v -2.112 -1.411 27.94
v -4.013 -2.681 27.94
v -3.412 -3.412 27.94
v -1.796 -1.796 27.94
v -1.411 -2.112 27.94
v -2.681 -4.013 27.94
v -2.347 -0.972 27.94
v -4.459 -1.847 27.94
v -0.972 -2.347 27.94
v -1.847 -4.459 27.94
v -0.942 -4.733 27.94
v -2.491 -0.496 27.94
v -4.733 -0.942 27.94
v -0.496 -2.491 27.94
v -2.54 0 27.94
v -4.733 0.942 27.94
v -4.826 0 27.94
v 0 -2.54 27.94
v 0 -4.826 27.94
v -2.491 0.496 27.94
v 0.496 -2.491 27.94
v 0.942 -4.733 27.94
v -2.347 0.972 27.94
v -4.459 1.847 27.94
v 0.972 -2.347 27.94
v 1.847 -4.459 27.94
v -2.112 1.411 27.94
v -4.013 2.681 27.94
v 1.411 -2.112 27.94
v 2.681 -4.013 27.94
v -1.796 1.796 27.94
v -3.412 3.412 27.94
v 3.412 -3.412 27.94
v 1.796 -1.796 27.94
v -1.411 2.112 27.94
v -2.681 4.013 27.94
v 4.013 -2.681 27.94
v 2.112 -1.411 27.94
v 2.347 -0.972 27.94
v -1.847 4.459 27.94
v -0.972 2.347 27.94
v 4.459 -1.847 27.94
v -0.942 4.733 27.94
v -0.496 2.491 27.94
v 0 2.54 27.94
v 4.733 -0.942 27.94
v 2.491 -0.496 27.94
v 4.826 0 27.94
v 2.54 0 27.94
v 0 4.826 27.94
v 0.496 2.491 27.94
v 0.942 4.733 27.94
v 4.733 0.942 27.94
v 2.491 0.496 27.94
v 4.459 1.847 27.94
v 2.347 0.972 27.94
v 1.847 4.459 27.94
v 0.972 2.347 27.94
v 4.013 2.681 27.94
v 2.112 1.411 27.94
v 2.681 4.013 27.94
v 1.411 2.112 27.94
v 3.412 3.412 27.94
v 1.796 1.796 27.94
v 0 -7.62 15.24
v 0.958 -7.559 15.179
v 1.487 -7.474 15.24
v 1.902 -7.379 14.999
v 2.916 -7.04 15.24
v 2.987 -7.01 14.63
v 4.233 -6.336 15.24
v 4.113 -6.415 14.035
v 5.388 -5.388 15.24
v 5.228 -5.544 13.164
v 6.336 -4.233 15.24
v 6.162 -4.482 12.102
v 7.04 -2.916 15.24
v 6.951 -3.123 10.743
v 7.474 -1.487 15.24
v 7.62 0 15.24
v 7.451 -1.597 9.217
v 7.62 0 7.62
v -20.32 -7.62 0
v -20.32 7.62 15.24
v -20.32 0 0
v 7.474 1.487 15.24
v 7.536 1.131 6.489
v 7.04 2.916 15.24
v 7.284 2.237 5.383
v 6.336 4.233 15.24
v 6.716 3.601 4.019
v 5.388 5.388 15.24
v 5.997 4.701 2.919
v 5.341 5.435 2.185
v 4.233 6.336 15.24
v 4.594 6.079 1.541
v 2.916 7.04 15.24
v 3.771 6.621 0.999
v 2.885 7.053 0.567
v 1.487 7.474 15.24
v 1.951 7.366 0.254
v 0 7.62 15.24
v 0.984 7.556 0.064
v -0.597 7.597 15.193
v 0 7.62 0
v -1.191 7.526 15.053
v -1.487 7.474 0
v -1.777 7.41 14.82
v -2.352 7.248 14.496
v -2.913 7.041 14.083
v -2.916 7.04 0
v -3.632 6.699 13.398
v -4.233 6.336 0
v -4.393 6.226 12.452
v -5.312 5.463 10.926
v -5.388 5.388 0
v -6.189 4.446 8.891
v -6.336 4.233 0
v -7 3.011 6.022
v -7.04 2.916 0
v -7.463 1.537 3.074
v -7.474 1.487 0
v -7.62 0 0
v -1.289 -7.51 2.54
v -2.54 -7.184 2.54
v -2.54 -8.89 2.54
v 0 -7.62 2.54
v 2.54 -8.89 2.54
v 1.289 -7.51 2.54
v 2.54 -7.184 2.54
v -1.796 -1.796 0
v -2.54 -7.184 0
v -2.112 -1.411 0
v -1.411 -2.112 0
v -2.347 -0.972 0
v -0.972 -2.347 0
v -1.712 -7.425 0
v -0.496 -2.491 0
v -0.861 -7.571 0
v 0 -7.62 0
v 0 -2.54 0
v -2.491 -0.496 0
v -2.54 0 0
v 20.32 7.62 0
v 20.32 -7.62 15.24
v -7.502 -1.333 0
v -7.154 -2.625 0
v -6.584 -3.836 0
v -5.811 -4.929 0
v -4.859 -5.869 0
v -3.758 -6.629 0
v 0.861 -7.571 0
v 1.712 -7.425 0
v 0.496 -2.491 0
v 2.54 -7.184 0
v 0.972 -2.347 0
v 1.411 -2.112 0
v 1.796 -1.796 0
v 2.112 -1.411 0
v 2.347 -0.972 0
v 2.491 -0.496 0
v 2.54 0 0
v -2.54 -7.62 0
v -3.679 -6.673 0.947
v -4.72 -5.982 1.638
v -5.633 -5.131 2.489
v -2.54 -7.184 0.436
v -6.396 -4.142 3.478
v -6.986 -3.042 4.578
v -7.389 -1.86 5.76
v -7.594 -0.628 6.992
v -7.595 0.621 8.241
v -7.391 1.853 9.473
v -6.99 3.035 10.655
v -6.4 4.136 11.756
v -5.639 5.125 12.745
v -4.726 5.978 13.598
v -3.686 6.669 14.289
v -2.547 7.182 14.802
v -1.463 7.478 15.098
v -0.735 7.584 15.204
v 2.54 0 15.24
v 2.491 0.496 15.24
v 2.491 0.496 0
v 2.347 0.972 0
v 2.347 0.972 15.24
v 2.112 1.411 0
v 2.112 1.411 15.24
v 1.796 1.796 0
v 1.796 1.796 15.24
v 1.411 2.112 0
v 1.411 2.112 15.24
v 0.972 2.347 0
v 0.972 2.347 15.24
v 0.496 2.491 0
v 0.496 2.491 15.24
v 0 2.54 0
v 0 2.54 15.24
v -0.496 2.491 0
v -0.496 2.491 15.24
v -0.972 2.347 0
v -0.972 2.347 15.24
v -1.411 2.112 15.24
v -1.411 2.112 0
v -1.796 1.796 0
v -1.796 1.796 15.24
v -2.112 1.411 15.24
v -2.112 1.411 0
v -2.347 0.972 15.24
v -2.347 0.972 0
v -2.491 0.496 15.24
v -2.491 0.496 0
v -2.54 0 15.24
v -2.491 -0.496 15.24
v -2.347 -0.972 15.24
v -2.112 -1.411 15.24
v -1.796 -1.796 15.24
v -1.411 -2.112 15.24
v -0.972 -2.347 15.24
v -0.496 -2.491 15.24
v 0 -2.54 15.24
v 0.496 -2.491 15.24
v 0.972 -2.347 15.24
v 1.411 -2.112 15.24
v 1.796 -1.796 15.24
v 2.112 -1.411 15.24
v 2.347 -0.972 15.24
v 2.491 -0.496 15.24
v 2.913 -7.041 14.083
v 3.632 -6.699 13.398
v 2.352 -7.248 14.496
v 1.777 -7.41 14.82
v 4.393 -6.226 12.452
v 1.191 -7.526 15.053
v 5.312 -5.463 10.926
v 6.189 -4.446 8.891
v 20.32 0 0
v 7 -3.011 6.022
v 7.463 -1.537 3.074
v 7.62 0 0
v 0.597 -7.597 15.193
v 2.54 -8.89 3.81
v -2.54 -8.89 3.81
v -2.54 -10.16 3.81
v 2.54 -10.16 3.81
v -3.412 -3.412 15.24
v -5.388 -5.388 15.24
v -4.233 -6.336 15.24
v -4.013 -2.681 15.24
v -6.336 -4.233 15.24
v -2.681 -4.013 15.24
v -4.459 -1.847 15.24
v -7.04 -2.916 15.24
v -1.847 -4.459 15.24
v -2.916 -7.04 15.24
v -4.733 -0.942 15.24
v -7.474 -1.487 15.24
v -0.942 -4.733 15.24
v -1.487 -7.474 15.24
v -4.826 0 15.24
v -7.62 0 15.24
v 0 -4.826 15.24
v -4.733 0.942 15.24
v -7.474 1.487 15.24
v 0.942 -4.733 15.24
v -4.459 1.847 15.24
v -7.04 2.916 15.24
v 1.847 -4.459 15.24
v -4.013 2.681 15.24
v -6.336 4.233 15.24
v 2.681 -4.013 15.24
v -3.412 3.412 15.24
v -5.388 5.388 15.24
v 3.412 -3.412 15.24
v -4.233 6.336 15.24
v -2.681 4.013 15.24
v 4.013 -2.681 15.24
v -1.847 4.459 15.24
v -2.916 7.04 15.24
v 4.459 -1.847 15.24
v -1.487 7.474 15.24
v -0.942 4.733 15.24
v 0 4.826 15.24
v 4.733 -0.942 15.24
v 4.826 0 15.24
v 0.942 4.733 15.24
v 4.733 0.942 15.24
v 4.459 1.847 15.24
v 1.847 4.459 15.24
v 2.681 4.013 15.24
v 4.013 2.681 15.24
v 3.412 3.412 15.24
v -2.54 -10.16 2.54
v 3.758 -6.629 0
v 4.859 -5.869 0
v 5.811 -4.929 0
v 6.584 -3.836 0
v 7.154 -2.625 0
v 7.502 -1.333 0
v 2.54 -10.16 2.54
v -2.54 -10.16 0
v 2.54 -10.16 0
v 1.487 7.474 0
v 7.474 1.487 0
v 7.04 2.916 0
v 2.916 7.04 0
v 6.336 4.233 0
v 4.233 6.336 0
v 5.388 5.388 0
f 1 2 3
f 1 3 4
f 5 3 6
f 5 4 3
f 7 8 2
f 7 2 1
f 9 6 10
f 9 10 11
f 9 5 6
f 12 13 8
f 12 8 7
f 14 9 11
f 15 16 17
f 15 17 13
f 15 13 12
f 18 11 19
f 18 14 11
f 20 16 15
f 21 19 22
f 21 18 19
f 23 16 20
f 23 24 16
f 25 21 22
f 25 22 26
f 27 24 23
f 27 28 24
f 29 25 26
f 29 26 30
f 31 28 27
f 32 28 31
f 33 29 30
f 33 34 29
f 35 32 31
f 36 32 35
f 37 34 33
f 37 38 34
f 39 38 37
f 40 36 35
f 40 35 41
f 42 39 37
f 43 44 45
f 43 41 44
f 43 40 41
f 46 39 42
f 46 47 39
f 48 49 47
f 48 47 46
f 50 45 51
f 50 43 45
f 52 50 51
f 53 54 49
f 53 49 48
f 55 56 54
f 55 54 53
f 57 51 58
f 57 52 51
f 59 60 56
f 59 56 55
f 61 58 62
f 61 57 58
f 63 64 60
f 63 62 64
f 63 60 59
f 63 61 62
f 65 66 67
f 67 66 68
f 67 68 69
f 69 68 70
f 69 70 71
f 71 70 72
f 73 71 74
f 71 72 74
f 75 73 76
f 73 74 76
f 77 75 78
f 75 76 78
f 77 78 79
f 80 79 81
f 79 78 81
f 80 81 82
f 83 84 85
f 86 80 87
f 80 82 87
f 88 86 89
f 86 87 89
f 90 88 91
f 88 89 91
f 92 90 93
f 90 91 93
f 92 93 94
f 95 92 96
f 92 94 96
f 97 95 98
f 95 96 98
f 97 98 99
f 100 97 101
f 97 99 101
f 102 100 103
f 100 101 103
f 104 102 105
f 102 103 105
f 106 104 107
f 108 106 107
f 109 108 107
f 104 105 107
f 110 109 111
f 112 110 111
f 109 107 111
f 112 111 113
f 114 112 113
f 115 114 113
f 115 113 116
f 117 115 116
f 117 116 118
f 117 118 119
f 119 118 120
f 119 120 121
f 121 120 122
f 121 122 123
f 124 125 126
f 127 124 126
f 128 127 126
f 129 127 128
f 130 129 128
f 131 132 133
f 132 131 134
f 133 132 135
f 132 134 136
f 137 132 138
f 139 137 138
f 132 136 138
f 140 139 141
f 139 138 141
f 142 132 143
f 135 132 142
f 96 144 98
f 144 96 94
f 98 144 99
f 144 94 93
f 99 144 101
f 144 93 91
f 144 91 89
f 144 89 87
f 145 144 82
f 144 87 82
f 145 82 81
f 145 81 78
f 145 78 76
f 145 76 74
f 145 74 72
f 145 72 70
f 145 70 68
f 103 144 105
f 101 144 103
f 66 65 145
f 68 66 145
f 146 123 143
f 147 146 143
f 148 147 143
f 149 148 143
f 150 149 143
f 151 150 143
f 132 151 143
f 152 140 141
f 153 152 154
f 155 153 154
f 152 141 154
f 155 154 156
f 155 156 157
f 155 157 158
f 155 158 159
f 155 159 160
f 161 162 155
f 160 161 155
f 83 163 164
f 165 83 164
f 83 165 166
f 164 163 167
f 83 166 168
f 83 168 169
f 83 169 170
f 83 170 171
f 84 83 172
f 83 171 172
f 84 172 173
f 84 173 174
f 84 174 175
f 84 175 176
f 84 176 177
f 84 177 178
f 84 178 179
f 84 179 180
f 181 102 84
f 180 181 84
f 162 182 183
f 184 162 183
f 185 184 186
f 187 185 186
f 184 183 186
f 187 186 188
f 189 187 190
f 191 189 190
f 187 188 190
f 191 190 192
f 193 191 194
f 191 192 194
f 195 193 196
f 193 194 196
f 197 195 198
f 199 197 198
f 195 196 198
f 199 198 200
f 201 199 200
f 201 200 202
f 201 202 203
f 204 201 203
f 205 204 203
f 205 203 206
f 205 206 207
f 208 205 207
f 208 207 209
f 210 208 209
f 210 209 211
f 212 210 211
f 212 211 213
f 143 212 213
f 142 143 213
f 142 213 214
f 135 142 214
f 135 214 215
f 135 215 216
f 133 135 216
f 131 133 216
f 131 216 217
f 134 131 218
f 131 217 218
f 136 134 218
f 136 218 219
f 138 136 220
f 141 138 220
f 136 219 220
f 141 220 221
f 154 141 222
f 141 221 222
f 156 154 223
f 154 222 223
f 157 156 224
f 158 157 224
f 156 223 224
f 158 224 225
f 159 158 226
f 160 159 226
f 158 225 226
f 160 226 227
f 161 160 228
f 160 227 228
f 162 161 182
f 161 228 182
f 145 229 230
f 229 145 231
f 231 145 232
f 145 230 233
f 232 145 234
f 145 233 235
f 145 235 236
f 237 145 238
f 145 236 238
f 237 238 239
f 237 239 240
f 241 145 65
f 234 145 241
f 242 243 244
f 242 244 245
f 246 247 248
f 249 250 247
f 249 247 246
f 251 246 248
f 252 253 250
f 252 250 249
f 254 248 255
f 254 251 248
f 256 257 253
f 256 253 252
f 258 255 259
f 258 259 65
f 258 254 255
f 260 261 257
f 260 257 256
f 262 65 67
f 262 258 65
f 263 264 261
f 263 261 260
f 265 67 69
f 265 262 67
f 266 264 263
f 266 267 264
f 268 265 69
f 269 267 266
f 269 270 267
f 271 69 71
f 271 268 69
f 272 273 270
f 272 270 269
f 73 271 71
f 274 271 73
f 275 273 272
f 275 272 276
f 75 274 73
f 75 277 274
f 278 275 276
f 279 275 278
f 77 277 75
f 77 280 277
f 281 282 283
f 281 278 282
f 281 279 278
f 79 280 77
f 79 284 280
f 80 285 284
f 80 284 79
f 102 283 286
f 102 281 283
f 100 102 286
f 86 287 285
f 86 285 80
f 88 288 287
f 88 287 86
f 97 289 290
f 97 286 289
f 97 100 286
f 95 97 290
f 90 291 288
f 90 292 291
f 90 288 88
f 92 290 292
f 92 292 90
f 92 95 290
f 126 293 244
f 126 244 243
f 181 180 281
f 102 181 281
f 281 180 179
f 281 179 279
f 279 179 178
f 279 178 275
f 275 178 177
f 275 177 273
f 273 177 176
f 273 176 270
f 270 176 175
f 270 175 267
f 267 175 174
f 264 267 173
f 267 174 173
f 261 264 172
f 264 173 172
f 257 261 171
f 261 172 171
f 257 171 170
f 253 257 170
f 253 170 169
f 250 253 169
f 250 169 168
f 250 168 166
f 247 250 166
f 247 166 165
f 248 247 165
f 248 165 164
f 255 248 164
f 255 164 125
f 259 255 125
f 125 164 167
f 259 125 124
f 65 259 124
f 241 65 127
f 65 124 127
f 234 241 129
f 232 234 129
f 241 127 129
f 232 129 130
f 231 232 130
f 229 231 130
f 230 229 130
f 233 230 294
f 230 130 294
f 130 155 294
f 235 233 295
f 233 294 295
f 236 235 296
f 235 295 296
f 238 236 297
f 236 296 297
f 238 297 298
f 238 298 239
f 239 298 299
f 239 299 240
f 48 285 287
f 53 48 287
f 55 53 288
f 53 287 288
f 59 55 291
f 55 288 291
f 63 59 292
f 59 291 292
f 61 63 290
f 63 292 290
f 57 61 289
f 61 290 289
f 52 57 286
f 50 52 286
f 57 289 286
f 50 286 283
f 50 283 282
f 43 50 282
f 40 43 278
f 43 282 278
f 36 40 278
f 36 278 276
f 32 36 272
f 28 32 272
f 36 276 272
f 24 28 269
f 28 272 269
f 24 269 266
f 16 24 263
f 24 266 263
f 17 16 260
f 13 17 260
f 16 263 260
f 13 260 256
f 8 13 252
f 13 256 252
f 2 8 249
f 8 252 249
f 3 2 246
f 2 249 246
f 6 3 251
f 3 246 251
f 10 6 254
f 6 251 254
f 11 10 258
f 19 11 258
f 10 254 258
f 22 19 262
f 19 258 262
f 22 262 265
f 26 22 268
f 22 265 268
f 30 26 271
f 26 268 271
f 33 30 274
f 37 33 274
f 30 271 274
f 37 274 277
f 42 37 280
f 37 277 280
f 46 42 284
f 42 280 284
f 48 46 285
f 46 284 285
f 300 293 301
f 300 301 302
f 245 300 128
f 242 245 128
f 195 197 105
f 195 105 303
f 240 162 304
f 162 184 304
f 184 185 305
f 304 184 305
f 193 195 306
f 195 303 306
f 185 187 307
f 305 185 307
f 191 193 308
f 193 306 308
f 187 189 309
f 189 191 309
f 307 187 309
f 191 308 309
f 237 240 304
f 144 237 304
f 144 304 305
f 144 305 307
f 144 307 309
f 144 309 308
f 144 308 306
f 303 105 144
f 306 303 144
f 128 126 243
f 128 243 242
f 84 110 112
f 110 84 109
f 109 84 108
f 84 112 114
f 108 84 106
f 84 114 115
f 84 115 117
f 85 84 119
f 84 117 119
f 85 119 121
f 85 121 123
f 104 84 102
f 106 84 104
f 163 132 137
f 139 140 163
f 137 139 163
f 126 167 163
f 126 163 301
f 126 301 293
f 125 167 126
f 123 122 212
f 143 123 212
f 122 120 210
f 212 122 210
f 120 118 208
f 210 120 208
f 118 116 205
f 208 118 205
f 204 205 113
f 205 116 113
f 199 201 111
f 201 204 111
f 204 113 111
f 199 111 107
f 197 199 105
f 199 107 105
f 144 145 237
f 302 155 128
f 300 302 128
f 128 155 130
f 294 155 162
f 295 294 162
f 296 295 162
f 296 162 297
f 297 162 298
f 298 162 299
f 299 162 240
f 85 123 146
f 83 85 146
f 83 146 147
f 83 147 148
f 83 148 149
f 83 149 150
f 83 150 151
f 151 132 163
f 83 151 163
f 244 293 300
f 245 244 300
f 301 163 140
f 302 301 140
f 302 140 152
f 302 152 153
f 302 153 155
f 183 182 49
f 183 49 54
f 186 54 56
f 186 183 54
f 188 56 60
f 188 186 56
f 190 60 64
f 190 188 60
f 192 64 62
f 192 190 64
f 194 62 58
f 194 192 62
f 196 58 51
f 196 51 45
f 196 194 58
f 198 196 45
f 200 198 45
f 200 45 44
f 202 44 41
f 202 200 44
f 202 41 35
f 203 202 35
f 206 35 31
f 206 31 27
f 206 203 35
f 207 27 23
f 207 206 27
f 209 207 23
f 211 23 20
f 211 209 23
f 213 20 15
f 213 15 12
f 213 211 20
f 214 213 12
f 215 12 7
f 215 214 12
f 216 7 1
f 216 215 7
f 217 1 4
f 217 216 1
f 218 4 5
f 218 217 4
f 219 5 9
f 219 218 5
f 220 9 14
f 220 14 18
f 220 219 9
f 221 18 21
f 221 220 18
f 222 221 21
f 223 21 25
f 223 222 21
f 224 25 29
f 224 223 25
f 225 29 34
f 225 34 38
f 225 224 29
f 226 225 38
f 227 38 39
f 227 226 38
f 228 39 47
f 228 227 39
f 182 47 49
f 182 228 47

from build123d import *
from build123d import SkipClean  # not in build123d's __all__

# Parameters (mm, degrees)
F0_R      = 7.62
F1_DEPTH  = 15.24
F3_DEPTH  = 20.32
F5_COUNT  = 2
F6_W      = 5.0799995622
F6_H      = 2.54
F7_DEPTH  = 10.16
F8_W      = 5.0799995622
F8_H      = 1.27
F9_DEPTH  = 1.27
F10_R     = 2.54
F11_DEPTH = 15.241
F12_R     = 4.826
F12_R_2   = 2.54
F13_DEPTH = 12.7


with BuildPart() as f1:
    # F0 (on Top) → F1 (new body)
    with BuildSketch(Plane.XY):
        Circle(F0_R)
    extrude(amount=F1_DEPTH)



with BuildPart() as f3:
    # F2 (on Right) → F3 (new body)
    with BuildSketch(Plane.YZ):
        Polygon((-7.62, 15.24), (0, 0), (7.62, 0), align=None)
    extrude(amount=F3_DEPTH)


with BuildPart() as f1_1:
    add(f1.part, clean=False)

    with SkipClean():  # cleaning this boolean's faces spoils the solid; the shape is the same uncleaned
        add(f3.part)  # F5 merges F3
    # F5: F3 ×2 about axis
    f5_axis = Axis((0, 0, 17.5851359963), (0, 0, 1))
    with SkipClean():  # cleaning this boolean's faces spoils the solid; the shape is the same uncleaned
        for i in range(1, F5_COUNT):
            add(f3.part.rotate(f5_axis, i * 360 / F5_COUNT), clean=False)

    # F6 (on Front) → F7 (join)
    with BuildSketch(Plane.XZ):
        with Locations((0, 1.27)):
            Rectangle(F6_W, F6_H)
    with SkipClean():  # cleaning this boolean's faces spoils the solid; the shape is the same uncleaned
        extrude(amount=F7_DEPTH)

    # F8 (on face) → F9 (join)
    with BuildSketch(Plane.XY.offset(2.54)):
        with Locations((0, -9.525)):
            Rectangle(F8_W, F8_H)
    with SkipClean():  # cleaning this boolean's faces spoils the solid; the shape is the same uncleaned
        extrude(amount=F9_DEPTH)

    # F10 (on face) → F11 (cut, through all)
    with BuildSketch(Plane.XY.offset(15.24)):
        Circle(F10_R)
    with SkipClean():  # cleaning this boolean's faces spoils the solid; the shape is the same uncleaned
        extrude(amount=-F11_DEPTH, mode=Mode.SUBTRACT)

    # F12 (on face) → F13 (join)
    with BuildSketch(Plane.XY.offset(15.24)):
        Circle(F12_R)
        Circle(F12_R_2, mode=Mode.SUBTRACT)
    with SkipClean():  # cleaning this boolean's faces spoils the solid; the shape is the same uncleaned
        extrude(amount=F13_DEPTH)


solid = f1_1.part
